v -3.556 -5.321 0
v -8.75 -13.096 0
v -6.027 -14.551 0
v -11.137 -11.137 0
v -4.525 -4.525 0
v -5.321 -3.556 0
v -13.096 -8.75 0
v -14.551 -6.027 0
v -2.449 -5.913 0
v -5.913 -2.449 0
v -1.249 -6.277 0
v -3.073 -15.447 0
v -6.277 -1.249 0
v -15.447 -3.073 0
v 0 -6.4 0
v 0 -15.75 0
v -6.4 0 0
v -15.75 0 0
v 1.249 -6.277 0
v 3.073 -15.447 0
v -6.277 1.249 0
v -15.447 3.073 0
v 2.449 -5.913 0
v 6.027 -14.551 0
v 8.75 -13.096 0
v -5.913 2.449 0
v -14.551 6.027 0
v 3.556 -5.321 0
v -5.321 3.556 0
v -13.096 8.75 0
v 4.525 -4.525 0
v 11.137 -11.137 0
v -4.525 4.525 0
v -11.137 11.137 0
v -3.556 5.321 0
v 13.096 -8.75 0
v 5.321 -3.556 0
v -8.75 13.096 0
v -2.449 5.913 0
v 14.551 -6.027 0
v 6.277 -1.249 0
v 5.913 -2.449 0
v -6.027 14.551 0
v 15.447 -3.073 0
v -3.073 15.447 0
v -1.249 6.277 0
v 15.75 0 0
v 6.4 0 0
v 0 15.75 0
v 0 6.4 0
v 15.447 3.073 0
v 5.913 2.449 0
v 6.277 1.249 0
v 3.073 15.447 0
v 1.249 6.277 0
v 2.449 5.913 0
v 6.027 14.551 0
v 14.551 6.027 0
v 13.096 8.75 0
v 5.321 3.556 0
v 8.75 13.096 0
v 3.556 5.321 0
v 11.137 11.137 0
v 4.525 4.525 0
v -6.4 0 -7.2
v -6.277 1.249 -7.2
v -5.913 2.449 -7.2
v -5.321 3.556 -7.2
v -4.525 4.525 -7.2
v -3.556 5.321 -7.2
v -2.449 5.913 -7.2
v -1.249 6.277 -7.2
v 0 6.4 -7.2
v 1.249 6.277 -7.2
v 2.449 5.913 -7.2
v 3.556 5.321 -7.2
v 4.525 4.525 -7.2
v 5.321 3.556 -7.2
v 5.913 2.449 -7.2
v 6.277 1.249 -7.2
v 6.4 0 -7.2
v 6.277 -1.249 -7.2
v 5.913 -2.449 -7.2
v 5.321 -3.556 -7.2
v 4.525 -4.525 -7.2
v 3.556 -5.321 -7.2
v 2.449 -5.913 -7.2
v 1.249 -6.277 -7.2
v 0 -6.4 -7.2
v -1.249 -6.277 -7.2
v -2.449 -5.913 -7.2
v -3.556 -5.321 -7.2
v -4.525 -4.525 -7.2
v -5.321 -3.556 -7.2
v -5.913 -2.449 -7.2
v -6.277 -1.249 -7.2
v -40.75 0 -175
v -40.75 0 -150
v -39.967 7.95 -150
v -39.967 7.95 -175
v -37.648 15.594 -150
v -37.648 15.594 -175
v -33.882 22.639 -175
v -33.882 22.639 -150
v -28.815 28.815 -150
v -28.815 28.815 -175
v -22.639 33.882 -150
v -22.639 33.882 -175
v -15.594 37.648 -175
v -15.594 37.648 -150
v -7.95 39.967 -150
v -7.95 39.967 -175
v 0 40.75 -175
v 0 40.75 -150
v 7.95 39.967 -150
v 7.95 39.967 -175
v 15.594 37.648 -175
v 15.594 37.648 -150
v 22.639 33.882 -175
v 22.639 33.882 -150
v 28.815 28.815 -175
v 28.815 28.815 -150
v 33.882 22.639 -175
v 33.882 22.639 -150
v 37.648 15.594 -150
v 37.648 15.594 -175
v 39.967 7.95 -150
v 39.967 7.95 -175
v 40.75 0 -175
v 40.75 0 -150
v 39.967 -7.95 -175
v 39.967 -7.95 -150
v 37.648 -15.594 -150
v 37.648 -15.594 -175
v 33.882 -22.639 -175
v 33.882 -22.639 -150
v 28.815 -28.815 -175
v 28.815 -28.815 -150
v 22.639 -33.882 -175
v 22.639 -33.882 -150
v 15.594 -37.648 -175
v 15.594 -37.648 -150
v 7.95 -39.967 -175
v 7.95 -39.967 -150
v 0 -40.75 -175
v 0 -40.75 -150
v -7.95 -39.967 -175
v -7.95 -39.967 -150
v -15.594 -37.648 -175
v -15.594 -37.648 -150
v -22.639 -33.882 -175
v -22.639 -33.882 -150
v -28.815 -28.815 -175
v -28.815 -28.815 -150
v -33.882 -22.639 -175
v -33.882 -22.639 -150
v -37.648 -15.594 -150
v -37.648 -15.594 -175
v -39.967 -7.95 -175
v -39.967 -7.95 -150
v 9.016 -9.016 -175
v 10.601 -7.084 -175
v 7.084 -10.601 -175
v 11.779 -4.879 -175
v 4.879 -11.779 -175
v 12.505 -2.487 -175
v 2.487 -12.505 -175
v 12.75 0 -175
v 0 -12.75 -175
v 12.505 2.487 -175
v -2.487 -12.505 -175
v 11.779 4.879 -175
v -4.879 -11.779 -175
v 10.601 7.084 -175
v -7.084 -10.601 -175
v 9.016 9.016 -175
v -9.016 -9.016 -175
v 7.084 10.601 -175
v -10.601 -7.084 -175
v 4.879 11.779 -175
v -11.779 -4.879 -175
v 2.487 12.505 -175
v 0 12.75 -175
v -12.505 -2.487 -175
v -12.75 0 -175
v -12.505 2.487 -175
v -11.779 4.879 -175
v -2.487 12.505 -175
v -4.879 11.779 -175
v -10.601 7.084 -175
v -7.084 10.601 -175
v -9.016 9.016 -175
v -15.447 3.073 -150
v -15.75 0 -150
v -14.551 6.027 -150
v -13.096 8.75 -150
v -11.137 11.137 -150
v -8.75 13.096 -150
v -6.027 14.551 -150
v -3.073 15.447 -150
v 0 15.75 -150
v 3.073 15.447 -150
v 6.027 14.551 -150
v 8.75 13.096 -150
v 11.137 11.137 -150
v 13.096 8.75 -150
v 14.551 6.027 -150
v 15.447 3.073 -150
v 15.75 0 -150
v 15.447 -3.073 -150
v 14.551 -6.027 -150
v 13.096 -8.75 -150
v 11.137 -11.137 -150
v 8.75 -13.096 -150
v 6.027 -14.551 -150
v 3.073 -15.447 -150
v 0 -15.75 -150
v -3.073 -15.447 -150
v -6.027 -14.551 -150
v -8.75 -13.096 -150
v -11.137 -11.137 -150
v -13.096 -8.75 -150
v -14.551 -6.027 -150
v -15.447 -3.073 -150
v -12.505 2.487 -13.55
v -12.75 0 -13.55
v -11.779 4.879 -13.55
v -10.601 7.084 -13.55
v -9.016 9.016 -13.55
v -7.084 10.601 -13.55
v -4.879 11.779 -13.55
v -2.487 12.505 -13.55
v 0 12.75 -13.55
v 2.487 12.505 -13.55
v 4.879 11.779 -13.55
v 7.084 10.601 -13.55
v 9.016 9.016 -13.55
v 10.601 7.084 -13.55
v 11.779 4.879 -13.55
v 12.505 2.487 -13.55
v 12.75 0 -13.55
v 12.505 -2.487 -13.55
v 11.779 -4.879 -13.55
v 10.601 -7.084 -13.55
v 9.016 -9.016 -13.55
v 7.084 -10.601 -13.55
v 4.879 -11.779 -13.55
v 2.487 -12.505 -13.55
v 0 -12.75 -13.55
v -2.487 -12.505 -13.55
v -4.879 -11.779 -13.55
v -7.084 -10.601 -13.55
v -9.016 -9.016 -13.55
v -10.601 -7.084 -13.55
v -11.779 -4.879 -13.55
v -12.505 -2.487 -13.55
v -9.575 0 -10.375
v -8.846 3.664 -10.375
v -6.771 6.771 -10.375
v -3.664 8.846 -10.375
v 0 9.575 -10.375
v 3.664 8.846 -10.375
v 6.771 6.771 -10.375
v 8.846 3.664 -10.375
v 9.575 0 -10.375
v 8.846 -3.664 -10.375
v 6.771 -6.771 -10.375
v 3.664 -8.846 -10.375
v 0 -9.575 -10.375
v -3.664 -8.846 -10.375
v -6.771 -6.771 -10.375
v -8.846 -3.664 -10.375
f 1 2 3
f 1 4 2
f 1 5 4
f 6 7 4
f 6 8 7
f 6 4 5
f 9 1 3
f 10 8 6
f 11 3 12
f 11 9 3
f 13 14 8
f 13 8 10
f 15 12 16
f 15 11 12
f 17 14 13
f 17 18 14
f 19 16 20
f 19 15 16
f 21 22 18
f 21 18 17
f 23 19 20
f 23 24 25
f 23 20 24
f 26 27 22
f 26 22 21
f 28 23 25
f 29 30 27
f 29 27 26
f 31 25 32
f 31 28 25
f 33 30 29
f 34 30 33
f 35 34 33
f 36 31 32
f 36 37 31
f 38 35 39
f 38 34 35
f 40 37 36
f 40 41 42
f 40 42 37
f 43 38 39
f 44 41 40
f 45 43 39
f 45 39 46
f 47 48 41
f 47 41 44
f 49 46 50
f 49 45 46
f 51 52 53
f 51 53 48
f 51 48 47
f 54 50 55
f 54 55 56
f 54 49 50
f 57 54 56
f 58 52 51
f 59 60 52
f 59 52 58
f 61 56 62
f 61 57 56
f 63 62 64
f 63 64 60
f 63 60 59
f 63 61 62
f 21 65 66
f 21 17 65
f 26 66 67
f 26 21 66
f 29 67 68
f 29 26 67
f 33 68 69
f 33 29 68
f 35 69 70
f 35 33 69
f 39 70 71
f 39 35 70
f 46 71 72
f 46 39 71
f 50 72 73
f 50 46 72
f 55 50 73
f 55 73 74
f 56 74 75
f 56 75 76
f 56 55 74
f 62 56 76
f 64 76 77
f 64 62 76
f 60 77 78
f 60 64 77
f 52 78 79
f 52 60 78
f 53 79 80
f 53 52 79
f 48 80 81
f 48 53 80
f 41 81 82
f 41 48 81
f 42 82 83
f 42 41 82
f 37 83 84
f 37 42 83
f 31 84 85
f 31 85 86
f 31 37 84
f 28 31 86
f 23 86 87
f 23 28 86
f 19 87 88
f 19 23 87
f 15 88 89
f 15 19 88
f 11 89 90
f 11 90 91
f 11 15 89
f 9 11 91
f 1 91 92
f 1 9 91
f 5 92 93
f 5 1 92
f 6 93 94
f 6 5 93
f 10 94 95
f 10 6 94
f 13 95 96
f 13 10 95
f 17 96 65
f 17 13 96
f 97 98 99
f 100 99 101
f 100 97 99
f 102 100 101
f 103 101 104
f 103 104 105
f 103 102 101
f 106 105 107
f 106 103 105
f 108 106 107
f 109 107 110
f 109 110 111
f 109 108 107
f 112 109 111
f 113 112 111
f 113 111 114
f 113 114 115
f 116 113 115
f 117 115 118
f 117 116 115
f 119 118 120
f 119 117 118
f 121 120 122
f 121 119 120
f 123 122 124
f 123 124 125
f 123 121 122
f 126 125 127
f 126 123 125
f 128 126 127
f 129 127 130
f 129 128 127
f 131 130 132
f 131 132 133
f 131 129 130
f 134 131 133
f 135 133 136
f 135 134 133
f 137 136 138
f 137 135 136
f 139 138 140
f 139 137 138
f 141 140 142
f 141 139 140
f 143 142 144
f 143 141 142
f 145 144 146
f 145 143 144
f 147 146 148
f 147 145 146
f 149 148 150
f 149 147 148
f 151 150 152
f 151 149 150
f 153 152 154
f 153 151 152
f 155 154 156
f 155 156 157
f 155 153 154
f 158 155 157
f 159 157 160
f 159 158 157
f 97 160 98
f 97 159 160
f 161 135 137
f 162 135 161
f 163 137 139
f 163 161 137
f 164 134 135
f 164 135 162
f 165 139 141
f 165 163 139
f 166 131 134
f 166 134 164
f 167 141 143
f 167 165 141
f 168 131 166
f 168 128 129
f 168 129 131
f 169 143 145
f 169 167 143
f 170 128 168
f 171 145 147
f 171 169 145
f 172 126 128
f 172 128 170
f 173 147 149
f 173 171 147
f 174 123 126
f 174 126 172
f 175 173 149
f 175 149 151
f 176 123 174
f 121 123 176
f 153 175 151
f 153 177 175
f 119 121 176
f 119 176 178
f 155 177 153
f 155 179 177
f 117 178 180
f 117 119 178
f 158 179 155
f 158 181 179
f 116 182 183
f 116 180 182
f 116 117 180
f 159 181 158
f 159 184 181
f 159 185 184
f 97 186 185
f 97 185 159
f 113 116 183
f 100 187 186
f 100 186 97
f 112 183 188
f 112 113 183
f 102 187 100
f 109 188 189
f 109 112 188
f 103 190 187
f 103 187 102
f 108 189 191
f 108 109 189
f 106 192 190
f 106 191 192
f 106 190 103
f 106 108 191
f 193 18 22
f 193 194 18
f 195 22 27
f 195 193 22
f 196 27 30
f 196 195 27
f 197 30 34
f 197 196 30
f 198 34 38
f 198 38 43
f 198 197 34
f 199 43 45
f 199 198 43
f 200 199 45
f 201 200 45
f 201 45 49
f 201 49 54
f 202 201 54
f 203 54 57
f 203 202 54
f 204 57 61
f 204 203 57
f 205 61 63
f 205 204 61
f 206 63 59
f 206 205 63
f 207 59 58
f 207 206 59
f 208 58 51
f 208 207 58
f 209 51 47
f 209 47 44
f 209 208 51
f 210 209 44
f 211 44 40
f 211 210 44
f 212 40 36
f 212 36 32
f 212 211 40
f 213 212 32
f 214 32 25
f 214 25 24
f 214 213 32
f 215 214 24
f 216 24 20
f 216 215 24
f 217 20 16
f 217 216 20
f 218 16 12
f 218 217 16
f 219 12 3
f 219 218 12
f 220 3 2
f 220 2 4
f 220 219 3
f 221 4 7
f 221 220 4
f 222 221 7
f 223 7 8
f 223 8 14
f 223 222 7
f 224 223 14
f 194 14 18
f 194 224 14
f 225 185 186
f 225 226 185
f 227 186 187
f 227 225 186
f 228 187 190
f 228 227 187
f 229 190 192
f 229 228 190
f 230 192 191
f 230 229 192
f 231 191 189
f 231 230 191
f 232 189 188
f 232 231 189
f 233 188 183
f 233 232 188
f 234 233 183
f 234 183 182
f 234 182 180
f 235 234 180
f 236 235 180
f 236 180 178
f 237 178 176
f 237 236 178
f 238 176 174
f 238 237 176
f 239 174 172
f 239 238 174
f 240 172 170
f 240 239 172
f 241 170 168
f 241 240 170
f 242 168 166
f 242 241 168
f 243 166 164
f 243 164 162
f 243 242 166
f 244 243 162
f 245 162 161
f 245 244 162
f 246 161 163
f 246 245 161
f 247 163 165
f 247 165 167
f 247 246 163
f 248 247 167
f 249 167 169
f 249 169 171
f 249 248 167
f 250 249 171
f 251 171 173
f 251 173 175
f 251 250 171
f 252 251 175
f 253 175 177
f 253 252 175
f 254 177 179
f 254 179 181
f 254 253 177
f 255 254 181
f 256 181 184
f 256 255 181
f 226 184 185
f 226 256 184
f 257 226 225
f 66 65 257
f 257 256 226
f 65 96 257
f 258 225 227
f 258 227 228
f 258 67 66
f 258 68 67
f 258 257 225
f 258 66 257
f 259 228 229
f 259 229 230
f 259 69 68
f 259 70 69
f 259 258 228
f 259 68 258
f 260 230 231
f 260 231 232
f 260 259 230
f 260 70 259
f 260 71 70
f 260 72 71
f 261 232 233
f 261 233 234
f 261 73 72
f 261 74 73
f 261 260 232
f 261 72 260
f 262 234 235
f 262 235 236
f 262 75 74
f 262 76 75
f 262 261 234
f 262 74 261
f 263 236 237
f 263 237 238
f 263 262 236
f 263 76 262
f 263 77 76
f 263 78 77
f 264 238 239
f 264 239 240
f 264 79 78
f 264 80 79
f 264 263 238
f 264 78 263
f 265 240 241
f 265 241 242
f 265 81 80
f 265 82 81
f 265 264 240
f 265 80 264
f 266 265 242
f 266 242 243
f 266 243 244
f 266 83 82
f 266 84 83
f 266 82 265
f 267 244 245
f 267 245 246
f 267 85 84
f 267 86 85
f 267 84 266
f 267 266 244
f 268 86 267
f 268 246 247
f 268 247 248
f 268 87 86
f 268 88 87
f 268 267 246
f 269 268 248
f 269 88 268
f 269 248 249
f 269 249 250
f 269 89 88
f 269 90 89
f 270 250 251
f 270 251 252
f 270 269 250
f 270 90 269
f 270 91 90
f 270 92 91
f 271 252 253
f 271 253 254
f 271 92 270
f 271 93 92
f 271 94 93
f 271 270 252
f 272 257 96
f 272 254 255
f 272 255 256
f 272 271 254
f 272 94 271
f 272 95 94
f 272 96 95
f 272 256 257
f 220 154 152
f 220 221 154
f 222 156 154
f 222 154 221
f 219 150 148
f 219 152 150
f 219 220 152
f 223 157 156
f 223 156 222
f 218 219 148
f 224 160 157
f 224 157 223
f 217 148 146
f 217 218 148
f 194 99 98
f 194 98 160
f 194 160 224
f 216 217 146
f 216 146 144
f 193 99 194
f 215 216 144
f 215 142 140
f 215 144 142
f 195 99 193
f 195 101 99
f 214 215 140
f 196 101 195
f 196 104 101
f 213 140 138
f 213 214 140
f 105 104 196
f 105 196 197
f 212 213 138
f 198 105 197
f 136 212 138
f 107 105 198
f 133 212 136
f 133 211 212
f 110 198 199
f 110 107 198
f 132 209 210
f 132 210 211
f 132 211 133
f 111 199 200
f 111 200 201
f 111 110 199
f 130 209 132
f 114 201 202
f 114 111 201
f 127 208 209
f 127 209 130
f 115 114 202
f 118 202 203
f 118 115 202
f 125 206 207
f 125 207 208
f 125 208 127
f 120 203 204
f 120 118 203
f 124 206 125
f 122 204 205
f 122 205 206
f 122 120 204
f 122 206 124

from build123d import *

# Parameters (mm, degrees)
F3_ANGLE = 180


with BuildPart() as f1:
    # F0 (on Front) → F1 (revolve)
    with BuildSketch(Plane.XZ):
        Polygon((12.75, 150), (15.75, 150), (40.75, 150), (40.75, 175), (12.75, 175), align=None)
        Polygon((6.4, 0), (12.75, 0), (12.75, 13.55), (6.4, 7.2), align=None)
        Polygon((12.75, 0), (15.75, 0), (15.75, 150), (12.75, 150), (12.75, 13.55), align=None)
    revolve(axis=Axis((0, 0, 75), (0, 0, 1)))


with BuildPart() as f1_1:
    # F3: moved
    add(f1.part.rotate(Axis((0, 25.257772, 0), (0, 1, 0)), F3_ANGLE))


solid = f1_1.part
